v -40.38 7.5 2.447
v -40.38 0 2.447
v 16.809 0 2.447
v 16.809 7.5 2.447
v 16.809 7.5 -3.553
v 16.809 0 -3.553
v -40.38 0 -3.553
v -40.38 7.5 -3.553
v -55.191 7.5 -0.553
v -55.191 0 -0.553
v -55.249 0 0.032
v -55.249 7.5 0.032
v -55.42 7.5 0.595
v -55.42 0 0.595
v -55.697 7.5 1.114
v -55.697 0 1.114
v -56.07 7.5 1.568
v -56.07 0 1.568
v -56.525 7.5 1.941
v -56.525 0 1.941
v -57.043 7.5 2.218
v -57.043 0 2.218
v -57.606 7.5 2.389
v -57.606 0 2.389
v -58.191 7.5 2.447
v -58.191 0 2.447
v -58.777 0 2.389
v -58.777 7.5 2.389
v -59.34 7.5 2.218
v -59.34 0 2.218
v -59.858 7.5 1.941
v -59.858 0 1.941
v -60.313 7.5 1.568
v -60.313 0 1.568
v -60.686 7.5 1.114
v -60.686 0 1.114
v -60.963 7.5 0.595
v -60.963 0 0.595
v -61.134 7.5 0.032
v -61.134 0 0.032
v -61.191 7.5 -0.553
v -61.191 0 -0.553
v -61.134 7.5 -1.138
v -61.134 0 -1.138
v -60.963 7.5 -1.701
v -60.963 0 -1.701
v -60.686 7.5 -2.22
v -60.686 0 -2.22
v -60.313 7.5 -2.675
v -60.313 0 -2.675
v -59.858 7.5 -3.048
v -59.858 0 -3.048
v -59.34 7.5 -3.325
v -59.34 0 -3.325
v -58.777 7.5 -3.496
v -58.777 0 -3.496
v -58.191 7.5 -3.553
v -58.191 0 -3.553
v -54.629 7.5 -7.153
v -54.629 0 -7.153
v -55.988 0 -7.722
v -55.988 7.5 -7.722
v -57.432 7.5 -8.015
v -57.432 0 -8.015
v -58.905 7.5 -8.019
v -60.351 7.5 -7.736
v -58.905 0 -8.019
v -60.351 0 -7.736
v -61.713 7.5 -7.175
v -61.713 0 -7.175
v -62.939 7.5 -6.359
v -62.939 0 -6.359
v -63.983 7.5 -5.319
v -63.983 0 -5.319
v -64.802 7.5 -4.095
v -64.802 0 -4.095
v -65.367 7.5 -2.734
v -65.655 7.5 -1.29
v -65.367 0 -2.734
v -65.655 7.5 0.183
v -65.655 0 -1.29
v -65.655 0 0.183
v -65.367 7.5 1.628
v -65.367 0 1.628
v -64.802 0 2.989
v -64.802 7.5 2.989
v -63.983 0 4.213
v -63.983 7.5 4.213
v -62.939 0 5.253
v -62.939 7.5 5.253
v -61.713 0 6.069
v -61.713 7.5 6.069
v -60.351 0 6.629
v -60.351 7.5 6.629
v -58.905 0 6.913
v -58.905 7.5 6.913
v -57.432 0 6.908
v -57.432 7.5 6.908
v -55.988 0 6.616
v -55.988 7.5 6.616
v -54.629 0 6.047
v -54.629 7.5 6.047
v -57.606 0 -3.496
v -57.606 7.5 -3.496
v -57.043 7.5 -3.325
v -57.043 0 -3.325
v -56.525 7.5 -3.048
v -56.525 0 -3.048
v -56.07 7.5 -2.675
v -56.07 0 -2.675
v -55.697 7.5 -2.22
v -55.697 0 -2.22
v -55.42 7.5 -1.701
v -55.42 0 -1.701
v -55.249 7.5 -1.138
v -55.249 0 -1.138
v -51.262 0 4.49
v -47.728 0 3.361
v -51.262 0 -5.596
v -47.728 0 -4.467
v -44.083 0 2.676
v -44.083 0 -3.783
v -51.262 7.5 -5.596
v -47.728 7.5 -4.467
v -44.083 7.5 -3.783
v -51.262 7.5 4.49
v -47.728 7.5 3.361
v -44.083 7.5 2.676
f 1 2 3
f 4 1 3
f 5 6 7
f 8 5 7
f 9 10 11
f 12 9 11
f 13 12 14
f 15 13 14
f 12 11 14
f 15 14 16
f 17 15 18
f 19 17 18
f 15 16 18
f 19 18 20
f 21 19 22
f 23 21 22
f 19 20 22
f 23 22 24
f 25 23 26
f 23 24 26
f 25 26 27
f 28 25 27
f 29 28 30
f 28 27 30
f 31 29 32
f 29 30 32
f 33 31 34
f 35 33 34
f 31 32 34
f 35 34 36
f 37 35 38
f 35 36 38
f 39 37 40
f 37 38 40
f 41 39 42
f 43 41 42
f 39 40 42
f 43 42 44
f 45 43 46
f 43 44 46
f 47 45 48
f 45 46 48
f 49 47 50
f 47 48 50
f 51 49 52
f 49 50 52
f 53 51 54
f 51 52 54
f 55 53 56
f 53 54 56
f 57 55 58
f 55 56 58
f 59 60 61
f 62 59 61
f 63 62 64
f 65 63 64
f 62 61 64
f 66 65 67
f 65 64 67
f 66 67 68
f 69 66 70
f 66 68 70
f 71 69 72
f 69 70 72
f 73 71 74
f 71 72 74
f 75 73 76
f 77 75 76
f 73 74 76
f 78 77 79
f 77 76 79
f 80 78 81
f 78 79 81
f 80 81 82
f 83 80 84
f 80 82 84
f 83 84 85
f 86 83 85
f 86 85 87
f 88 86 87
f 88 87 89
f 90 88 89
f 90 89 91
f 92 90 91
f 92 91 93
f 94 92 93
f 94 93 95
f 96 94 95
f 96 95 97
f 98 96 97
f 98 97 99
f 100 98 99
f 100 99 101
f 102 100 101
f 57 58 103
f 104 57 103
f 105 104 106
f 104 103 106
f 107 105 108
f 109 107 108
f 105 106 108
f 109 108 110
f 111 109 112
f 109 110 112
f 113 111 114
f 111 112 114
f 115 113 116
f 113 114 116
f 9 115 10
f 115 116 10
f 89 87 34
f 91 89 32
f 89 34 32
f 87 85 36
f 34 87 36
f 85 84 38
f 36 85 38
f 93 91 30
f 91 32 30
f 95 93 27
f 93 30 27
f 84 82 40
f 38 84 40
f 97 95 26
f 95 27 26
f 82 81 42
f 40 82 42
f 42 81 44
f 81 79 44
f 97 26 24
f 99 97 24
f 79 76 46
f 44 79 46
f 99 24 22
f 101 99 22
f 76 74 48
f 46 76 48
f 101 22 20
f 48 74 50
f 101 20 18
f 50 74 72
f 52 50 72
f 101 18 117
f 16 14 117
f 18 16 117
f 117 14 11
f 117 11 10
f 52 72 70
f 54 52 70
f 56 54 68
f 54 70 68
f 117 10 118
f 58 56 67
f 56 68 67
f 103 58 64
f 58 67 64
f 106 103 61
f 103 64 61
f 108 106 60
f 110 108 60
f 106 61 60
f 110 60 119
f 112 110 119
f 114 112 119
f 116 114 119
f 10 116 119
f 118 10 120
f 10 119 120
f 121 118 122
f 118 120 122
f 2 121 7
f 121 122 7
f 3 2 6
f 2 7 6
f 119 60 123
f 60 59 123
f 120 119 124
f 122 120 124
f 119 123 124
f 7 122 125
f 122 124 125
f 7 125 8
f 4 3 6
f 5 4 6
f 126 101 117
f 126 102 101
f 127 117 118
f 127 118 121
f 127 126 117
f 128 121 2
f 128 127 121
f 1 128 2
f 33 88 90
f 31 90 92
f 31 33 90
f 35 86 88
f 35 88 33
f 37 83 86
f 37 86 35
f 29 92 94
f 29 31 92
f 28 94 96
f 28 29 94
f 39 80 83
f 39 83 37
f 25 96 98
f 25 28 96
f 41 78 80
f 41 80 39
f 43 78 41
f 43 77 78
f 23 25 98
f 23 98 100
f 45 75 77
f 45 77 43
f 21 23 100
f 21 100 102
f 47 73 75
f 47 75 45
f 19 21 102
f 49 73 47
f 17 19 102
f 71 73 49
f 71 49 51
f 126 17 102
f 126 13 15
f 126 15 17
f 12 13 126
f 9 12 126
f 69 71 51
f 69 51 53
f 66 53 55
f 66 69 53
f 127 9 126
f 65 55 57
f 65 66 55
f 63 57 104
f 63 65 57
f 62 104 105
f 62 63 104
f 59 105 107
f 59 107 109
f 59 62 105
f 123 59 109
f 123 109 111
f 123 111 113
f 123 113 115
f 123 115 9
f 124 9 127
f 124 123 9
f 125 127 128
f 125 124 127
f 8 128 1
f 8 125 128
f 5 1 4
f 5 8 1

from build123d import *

# Parameters (mm, degrees)
BOSS_EXTRUDE1_DEPTH = 7.5
FILLET1_R           = 30
FILLET2_R           = 30


with BuildPart() as part:
    # Sketch1 → Boss-Extrude1 (new body)
    with BuildSketch(Plane(origin=(0, 0, 0), x_dir=(1, 0, 0), z_dir=(0, 1, 0))):
        with BuildLine():
            ThreePointArc((-58.191489362, -2.446808511), (-61.191489362, 0.553191489), (-58.191489362, 3.553191489))
            Line((-58.191489362, 3.553191489), (-51.317625819, 3.553191489))
            ThreePointArc((-51.317625819, 3.553191489), (-65.691489362, 0.553191489), (-51.317625819, -2.446808511))
            Line((-51.317625819, -2.446808511), (-58.191489362, -2.446808511))
        make_face()
        with BuildLine():
            Line((-51.317625819, 3.553191489), (-58.191489362, 3.553191489))
            ThreePointArc((-58.191489362, 3.553191489), (-56.070169018, 2.674511833), (-55.191489362, 0.553191489))
            ThreePointArc((-55.191489362, 0.553191489), (-56.070169018, -1.568128854), (-58.191489362, -2.446808511))
            Line((-58.191489362, -2.446808511), (-51.317625819, -2.446808511))
            ThreePointArc((-51.317625819, -2.446808511), (-50.849692015, -0.979130838), (-50.691489362, 0.553191489))
            ThreePointArc((-50.691489362, 0.553191489), (-50.849692015, 2.085513817), (-51.317625819, 3.553191489))
        make_face()
        with BuildLine():
            Line((16.808510638, 3.553191489), (-51.317625819, 3.553191489))
            ThreePointArc((-51.317625819, 3.553191489), (-50.849692015, 2.085513817), (-50.691489362, 0.553191489))
            ThreePointArc((-50.691489362, 0.553191489), (-50.849692015, -0.979130838), (-51.317625819, -2.446808511))
            Line((-51.317625819, -2.446808511), (16.808510638, -2.446808511))
            Line((16.808510638, -2.446808511), (16.808510638, 3.553191489))
        make_face()
    extrude(amount=BOSS_EXTRUDE1_DEPTH)

    # Fillet1
    fillet1_edges = [part.edges().sort_by_distance(p)[0] for p in [
        (-51.317625819, 3.75, 2.446808511),
    ]]
    fillet(fillet1_edges, radius=FILLET1_R)

    # Fillet2
    fillet2_edges = [part.edges().sort_by_distance(p)[0] for p in [
        (-51.317625819, 3.75, -3.553191489),
    ]]
    fillet(fillet2_edges, radius=FILLET2_R)


solid = part.part
